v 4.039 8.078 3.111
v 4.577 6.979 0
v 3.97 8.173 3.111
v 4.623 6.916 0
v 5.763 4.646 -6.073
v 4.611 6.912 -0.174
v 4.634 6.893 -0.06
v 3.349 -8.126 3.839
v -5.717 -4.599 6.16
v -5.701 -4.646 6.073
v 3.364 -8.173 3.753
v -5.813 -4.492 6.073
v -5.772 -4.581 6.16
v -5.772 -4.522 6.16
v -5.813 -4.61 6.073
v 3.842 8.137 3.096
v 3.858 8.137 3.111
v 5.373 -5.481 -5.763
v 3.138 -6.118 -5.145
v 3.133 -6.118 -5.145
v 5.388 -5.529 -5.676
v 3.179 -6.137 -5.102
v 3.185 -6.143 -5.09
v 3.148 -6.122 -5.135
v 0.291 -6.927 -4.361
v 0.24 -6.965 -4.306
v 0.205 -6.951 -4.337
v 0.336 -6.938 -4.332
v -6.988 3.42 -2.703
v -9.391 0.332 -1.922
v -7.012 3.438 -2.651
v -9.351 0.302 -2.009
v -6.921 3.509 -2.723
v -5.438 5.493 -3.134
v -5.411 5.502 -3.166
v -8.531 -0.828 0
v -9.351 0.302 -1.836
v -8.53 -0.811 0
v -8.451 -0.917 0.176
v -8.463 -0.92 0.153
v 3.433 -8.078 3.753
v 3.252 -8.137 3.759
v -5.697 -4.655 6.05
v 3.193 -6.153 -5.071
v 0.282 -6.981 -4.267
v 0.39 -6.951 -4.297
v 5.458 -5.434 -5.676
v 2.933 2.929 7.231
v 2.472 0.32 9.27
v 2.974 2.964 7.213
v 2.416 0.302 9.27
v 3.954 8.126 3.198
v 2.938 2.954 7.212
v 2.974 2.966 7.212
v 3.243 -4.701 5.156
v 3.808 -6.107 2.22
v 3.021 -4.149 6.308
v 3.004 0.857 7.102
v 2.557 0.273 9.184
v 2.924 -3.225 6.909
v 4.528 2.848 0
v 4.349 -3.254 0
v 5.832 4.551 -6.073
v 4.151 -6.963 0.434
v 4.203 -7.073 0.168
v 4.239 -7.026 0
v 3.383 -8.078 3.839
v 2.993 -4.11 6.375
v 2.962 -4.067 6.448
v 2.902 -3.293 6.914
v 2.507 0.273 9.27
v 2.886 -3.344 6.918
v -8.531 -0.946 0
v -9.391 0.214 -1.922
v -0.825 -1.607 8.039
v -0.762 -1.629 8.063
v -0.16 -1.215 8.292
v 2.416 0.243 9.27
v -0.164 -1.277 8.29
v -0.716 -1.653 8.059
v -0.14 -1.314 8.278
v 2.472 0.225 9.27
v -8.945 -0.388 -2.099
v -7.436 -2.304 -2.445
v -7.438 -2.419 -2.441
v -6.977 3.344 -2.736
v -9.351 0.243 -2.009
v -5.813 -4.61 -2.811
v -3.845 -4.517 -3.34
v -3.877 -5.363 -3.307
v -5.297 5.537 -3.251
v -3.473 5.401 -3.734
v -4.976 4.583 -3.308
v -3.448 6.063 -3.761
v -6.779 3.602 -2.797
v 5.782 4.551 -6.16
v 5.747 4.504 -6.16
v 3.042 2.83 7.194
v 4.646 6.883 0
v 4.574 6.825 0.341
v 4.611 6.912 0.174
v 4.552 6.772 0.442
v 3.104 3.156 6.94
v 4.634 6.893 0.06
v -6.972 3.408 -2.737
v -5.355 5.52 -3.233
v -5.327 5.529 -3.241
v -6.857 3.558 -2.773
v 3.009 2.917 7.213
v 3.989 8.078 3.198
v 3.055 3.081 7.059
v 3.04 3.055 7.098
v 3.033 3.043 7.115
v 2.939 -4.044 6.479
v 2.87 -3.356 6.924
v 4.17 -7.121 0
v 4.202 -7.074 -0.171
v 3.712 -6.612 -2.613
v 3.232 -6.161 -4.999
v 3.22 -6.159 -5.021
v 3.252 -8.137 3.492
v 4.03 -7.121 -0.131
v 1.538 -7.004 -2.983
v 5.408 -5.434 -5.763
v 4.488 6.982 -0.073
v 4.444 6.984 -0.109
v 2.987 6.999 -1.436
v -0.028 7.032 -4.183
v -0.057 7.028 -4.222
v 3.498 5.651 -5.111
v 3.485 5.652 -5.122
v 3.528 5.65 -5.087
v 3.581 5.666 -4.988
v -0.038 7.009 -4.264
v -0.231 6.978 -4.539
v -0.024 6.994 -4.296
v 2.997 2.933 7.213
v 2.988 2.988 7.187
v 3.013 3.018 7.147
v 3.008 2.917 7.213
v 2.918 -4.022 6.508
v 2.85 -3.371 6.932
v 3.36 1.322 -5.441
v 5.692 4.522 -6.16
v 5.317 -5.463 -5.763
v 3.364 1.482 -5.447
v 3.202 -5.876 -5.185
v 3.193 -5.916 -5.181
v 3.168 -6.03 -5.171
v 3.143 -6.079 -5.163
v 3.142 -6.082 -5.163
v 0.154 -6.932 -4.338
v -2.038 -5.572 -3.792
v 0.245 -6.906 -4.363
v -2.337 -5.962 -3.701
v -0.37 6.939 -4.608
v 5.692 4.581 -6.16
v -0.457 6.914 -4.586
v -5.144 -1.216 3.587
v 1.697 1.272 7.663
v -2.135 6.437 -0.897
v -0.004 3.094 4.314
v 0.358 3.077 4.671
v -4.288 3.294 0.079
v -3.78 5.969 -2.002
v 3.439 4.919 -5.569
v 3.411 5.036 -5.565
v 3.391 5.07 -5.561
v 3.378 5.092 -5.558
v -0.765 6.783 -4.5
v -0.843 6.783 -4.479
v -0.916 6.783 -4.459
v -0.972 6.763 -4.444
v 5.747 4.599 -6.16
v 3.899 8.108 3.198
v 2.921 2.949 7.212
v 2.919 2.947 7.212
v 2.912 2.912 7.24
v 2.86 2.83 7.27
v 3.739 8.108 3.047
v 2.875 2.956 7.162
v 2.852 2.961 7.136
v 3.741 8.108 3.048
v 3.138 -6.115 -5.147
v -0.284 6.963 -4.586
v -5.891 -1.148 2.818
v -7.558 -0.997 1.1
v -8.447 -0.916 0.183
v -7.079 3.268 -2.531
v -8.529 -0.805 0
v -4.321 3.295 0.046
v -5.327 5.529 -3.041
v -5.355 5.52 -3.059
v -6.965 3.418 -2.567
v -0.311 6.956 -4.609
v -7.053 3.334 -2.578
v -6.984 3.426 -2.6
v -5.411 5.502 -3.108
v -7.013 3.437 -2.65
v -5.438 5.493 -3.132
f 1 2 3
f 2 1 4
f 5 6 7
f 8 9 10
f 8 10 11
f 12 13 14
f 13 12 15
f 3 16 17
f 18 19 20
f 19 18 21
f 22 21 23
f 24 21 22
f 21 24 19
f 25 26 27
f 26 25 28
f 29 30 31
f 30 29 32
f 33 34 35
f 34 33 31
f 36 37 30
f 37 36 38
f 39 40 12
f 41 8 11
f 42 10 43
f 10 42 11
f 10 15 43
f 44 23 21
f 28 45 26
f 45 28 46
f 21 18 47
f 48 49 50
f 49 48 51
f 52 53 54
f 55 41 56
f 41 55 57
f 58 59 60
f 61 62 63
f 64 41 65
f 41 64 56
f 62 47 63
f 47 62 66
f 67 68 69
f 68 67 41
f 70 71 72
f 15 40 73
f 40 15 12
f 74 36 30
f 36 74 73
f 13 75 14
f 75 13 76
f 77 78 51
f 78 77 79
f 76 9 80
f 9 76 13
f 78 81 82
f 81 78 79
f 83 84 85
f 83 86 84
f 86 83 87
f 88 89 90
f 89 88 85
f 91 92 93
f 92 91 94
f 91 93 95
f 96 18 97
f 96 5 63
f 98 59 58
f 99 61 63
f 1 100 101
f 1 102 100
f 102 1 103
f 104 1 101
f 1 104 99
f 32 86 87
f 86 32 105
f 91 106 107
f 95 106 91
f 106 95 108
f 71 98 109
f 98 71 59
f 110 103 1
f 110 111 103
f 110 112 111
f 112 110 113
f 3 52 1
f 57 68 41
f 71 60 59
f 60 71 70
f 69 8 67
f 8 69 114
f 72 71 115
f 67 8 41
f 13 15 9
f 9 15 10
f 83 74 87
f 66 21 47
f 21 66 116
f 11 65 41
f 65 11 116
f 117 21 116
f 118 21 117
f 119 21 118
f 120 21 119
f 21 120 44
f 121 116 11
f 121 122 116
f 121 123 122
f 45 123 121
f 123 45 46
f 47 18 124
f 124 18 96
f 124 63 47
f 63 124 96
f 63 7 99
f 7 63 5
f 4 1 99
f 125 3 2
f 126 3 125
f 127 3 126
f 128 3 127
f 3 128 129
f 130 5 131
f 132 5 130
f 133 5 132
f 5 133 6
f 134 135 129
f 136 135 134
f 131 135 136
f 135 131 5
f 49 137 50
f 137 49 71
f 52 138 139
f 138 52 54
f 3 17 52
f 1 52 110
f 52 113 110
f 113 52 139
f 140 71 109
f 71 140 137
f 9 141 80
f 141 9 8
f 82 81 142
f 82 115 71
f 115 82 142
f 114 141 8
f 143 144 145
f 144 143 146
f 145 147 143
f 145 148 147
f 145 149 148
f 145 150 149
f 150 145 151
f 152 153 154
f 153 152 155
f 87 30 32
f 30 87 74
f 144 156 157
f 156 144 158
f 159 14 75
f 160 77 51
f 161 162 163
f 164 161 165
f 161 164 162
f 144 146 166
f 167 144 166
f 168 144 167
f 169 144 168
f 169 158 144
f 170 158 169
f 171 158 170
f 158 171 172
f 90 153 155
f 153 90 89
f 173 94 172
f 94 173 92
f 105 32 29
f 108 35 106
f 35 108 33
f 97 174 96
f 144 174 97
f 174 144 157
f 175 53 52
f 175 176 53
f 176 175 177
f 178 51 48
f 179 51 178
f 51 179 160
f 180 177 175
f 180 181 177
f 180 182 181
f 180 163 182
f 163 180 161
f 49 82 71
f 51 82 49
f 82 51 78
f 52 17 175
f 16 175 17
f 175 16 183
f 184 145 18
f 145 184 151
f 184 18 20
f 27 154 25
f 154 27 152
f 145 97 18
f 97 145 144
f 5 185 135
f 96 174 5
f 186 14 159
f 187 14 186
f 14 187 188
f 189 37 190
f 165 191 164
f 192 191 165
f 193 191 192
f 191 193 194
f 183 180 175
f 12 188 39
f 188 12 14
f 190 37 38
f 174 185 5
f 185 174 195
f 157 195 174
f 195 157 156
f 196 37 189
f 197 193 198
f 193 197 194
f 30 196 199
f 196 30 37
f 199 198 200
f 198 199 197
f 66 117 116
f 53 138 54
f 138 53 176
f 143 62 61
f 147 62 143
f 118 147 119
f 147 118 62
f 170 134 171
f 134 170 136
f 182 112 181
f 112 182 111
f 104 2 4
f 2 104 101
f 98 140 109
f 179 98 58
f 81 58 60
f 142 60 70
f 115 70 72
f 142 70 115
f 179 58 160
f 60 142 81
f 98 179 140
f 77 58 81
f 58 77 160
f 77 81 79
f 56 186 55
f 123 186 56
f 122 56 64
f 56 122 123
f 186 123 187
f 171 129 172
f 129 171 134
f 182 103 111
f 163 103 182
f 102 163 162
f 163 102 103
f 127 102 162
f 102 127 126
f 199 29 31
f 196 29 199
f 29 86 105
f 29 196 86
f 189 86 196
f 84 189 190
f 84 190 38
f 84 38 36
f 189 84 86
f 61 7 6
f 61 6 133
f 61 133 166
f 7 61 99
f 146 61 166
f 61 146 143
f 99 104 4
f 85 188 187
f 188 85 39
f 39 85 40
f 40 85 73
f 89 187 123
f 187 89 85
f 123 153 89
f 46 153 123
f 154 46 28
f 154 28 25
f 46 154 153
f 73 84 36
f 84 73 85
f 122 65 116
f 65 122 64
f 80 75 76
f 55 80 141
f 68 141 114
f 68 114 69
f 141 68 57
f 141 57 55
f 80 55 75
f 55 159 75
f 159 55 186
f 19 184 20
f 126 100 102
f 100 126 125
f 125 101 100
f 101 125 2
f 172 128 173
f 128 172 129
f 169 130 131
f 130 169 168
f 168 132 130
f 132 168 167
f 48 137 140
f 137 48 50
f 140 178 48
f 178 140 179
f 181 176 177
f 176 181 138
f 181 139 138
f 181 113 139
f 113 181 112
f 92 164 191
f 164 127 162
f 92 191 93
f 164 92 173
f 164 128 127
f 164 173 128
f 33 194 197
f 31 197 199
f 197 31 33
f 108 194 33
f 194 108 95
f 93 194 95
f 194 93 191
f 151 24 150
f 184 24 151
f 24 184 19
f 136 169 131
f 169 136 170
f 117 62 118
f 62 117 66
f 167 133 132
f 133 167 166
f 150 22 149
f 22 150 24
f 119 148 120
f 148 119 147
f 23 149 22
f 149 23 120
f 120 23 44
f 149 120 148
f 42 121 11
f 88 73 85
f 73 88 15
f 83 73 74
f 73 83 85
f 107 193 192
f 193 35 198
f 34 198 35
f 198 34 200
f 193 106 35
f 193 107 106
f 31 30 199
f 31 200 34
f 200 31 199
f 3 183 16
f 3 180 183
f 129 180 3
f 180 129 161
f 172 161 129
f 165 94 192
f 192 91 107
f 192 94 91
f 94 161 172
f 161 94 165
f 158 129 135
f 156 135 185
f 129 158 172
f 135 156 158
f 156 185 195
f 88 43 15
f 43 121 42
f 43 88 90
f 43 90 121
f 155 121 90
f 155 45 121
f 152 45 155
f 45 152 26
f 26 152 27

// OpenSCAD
// Auto-generated OpenSCAD file

    inner_points = 10*[[0.5357591741651873, -0.543383530882565, 0.5676309916995522], [-0.5731986516605712, -0.45512777948624156, -0.6072977089606933], [0.5731986515218852, 0.45512777955762335, 0.6072977089606933], [-0.5357591743038732, 0.5433835309539468, -0.5676309916995522], [0.3333250709014692, -0.8078126191713554, -0.3752887774762634], [0.3939034177856385, 0.8078126192720669, -0.31110668072560493], [-0.2456533920977693, -0.027272527020831643, 0.9183785262299818], [-0.9310270205482738, 0.02727252704475715, 0.19223265486419908], [0.24565339195908334, 0.027272527092213467, -0.9183785262299818]];

    outer_points = 10*[[-0.3333250709381238, 0.8078126192179577, -0.37528877748181], [-0.39390341794565986, -0.8078126192179577, -0.31110668065861835], [0.39390341794565986, 0.8078126192179577, 0.31110668065861835], [0.3333250709381238, -0.8078126192179577, 0.37528877748181], [-0.9310270204929976, 0.027272527075261566, -0.19223265478667906], [0.24565339210818965, 0.027272527075261566, 0.9183785262080897], [0.5731986515762008, 0.45512777945089933, -0.6072977090281112], [0.5357591741432581, -0.5433835309846493, -0.5676309917221422], [-0.5731986515762008, -0.45512777945089933, 0.6072977090281112]];

    // Convex hull for inner set (I)
    module inner_hull() {
        hull() {
            for (p = inner_points) {
                translate(p) sphere(r=0.1);
            }
        }
    }

    // Convex hull for outer set (O) minus inner hull (O \ I)
    module outer_minus_inner() {
        difference() {
            hull() {
                for (p = outer_points) {
                    translate(p) sphere(r=0.1);
                }
            }
            inner_hull(); // Subtract inner hull
        }
    }

    // Convex hull for outer set (O) minus all translated inner hulls
    module outer_minus_AllTranslationInner() {
        difference() {
            hull() {
                for (p = outer_points) {
                    translate(p) sphere(r=0.1);
                }
            }
            hull() {
                translate([0,0,50]) inner_hull();
                translate([0,0,-50]) inner_hull();
            }; // Subtract translated inner hulls
        }
    }

    // Difference between outer_minus_inner and outer_minus_AllTranslationInner
    module outer_minus_inner_diff() {
        difference() {
            // Outer minus inner
            difference() {
                hull() {
                    for (p = outer_points) {
                        translate(p) sphere(r=0.1);
                    }
                }
                inner_hull();
            }

            // Subtract Outer minus AllTranslationInner
            difference() {
                hull() {
                    for (p = outer_points) {
                        translate(p) sphere(r=0.1);
                    }
                }
                hull() {
                    translate([0,0,50]) inner_hull();
                    translate([0,0,-50]) inner_hull();
                };
            }
        }
    }

    // Rendering all with colors applied
    color([1, 1, 0, 1]) outer_minus_inner_diff(); // Opaque yellow
    
